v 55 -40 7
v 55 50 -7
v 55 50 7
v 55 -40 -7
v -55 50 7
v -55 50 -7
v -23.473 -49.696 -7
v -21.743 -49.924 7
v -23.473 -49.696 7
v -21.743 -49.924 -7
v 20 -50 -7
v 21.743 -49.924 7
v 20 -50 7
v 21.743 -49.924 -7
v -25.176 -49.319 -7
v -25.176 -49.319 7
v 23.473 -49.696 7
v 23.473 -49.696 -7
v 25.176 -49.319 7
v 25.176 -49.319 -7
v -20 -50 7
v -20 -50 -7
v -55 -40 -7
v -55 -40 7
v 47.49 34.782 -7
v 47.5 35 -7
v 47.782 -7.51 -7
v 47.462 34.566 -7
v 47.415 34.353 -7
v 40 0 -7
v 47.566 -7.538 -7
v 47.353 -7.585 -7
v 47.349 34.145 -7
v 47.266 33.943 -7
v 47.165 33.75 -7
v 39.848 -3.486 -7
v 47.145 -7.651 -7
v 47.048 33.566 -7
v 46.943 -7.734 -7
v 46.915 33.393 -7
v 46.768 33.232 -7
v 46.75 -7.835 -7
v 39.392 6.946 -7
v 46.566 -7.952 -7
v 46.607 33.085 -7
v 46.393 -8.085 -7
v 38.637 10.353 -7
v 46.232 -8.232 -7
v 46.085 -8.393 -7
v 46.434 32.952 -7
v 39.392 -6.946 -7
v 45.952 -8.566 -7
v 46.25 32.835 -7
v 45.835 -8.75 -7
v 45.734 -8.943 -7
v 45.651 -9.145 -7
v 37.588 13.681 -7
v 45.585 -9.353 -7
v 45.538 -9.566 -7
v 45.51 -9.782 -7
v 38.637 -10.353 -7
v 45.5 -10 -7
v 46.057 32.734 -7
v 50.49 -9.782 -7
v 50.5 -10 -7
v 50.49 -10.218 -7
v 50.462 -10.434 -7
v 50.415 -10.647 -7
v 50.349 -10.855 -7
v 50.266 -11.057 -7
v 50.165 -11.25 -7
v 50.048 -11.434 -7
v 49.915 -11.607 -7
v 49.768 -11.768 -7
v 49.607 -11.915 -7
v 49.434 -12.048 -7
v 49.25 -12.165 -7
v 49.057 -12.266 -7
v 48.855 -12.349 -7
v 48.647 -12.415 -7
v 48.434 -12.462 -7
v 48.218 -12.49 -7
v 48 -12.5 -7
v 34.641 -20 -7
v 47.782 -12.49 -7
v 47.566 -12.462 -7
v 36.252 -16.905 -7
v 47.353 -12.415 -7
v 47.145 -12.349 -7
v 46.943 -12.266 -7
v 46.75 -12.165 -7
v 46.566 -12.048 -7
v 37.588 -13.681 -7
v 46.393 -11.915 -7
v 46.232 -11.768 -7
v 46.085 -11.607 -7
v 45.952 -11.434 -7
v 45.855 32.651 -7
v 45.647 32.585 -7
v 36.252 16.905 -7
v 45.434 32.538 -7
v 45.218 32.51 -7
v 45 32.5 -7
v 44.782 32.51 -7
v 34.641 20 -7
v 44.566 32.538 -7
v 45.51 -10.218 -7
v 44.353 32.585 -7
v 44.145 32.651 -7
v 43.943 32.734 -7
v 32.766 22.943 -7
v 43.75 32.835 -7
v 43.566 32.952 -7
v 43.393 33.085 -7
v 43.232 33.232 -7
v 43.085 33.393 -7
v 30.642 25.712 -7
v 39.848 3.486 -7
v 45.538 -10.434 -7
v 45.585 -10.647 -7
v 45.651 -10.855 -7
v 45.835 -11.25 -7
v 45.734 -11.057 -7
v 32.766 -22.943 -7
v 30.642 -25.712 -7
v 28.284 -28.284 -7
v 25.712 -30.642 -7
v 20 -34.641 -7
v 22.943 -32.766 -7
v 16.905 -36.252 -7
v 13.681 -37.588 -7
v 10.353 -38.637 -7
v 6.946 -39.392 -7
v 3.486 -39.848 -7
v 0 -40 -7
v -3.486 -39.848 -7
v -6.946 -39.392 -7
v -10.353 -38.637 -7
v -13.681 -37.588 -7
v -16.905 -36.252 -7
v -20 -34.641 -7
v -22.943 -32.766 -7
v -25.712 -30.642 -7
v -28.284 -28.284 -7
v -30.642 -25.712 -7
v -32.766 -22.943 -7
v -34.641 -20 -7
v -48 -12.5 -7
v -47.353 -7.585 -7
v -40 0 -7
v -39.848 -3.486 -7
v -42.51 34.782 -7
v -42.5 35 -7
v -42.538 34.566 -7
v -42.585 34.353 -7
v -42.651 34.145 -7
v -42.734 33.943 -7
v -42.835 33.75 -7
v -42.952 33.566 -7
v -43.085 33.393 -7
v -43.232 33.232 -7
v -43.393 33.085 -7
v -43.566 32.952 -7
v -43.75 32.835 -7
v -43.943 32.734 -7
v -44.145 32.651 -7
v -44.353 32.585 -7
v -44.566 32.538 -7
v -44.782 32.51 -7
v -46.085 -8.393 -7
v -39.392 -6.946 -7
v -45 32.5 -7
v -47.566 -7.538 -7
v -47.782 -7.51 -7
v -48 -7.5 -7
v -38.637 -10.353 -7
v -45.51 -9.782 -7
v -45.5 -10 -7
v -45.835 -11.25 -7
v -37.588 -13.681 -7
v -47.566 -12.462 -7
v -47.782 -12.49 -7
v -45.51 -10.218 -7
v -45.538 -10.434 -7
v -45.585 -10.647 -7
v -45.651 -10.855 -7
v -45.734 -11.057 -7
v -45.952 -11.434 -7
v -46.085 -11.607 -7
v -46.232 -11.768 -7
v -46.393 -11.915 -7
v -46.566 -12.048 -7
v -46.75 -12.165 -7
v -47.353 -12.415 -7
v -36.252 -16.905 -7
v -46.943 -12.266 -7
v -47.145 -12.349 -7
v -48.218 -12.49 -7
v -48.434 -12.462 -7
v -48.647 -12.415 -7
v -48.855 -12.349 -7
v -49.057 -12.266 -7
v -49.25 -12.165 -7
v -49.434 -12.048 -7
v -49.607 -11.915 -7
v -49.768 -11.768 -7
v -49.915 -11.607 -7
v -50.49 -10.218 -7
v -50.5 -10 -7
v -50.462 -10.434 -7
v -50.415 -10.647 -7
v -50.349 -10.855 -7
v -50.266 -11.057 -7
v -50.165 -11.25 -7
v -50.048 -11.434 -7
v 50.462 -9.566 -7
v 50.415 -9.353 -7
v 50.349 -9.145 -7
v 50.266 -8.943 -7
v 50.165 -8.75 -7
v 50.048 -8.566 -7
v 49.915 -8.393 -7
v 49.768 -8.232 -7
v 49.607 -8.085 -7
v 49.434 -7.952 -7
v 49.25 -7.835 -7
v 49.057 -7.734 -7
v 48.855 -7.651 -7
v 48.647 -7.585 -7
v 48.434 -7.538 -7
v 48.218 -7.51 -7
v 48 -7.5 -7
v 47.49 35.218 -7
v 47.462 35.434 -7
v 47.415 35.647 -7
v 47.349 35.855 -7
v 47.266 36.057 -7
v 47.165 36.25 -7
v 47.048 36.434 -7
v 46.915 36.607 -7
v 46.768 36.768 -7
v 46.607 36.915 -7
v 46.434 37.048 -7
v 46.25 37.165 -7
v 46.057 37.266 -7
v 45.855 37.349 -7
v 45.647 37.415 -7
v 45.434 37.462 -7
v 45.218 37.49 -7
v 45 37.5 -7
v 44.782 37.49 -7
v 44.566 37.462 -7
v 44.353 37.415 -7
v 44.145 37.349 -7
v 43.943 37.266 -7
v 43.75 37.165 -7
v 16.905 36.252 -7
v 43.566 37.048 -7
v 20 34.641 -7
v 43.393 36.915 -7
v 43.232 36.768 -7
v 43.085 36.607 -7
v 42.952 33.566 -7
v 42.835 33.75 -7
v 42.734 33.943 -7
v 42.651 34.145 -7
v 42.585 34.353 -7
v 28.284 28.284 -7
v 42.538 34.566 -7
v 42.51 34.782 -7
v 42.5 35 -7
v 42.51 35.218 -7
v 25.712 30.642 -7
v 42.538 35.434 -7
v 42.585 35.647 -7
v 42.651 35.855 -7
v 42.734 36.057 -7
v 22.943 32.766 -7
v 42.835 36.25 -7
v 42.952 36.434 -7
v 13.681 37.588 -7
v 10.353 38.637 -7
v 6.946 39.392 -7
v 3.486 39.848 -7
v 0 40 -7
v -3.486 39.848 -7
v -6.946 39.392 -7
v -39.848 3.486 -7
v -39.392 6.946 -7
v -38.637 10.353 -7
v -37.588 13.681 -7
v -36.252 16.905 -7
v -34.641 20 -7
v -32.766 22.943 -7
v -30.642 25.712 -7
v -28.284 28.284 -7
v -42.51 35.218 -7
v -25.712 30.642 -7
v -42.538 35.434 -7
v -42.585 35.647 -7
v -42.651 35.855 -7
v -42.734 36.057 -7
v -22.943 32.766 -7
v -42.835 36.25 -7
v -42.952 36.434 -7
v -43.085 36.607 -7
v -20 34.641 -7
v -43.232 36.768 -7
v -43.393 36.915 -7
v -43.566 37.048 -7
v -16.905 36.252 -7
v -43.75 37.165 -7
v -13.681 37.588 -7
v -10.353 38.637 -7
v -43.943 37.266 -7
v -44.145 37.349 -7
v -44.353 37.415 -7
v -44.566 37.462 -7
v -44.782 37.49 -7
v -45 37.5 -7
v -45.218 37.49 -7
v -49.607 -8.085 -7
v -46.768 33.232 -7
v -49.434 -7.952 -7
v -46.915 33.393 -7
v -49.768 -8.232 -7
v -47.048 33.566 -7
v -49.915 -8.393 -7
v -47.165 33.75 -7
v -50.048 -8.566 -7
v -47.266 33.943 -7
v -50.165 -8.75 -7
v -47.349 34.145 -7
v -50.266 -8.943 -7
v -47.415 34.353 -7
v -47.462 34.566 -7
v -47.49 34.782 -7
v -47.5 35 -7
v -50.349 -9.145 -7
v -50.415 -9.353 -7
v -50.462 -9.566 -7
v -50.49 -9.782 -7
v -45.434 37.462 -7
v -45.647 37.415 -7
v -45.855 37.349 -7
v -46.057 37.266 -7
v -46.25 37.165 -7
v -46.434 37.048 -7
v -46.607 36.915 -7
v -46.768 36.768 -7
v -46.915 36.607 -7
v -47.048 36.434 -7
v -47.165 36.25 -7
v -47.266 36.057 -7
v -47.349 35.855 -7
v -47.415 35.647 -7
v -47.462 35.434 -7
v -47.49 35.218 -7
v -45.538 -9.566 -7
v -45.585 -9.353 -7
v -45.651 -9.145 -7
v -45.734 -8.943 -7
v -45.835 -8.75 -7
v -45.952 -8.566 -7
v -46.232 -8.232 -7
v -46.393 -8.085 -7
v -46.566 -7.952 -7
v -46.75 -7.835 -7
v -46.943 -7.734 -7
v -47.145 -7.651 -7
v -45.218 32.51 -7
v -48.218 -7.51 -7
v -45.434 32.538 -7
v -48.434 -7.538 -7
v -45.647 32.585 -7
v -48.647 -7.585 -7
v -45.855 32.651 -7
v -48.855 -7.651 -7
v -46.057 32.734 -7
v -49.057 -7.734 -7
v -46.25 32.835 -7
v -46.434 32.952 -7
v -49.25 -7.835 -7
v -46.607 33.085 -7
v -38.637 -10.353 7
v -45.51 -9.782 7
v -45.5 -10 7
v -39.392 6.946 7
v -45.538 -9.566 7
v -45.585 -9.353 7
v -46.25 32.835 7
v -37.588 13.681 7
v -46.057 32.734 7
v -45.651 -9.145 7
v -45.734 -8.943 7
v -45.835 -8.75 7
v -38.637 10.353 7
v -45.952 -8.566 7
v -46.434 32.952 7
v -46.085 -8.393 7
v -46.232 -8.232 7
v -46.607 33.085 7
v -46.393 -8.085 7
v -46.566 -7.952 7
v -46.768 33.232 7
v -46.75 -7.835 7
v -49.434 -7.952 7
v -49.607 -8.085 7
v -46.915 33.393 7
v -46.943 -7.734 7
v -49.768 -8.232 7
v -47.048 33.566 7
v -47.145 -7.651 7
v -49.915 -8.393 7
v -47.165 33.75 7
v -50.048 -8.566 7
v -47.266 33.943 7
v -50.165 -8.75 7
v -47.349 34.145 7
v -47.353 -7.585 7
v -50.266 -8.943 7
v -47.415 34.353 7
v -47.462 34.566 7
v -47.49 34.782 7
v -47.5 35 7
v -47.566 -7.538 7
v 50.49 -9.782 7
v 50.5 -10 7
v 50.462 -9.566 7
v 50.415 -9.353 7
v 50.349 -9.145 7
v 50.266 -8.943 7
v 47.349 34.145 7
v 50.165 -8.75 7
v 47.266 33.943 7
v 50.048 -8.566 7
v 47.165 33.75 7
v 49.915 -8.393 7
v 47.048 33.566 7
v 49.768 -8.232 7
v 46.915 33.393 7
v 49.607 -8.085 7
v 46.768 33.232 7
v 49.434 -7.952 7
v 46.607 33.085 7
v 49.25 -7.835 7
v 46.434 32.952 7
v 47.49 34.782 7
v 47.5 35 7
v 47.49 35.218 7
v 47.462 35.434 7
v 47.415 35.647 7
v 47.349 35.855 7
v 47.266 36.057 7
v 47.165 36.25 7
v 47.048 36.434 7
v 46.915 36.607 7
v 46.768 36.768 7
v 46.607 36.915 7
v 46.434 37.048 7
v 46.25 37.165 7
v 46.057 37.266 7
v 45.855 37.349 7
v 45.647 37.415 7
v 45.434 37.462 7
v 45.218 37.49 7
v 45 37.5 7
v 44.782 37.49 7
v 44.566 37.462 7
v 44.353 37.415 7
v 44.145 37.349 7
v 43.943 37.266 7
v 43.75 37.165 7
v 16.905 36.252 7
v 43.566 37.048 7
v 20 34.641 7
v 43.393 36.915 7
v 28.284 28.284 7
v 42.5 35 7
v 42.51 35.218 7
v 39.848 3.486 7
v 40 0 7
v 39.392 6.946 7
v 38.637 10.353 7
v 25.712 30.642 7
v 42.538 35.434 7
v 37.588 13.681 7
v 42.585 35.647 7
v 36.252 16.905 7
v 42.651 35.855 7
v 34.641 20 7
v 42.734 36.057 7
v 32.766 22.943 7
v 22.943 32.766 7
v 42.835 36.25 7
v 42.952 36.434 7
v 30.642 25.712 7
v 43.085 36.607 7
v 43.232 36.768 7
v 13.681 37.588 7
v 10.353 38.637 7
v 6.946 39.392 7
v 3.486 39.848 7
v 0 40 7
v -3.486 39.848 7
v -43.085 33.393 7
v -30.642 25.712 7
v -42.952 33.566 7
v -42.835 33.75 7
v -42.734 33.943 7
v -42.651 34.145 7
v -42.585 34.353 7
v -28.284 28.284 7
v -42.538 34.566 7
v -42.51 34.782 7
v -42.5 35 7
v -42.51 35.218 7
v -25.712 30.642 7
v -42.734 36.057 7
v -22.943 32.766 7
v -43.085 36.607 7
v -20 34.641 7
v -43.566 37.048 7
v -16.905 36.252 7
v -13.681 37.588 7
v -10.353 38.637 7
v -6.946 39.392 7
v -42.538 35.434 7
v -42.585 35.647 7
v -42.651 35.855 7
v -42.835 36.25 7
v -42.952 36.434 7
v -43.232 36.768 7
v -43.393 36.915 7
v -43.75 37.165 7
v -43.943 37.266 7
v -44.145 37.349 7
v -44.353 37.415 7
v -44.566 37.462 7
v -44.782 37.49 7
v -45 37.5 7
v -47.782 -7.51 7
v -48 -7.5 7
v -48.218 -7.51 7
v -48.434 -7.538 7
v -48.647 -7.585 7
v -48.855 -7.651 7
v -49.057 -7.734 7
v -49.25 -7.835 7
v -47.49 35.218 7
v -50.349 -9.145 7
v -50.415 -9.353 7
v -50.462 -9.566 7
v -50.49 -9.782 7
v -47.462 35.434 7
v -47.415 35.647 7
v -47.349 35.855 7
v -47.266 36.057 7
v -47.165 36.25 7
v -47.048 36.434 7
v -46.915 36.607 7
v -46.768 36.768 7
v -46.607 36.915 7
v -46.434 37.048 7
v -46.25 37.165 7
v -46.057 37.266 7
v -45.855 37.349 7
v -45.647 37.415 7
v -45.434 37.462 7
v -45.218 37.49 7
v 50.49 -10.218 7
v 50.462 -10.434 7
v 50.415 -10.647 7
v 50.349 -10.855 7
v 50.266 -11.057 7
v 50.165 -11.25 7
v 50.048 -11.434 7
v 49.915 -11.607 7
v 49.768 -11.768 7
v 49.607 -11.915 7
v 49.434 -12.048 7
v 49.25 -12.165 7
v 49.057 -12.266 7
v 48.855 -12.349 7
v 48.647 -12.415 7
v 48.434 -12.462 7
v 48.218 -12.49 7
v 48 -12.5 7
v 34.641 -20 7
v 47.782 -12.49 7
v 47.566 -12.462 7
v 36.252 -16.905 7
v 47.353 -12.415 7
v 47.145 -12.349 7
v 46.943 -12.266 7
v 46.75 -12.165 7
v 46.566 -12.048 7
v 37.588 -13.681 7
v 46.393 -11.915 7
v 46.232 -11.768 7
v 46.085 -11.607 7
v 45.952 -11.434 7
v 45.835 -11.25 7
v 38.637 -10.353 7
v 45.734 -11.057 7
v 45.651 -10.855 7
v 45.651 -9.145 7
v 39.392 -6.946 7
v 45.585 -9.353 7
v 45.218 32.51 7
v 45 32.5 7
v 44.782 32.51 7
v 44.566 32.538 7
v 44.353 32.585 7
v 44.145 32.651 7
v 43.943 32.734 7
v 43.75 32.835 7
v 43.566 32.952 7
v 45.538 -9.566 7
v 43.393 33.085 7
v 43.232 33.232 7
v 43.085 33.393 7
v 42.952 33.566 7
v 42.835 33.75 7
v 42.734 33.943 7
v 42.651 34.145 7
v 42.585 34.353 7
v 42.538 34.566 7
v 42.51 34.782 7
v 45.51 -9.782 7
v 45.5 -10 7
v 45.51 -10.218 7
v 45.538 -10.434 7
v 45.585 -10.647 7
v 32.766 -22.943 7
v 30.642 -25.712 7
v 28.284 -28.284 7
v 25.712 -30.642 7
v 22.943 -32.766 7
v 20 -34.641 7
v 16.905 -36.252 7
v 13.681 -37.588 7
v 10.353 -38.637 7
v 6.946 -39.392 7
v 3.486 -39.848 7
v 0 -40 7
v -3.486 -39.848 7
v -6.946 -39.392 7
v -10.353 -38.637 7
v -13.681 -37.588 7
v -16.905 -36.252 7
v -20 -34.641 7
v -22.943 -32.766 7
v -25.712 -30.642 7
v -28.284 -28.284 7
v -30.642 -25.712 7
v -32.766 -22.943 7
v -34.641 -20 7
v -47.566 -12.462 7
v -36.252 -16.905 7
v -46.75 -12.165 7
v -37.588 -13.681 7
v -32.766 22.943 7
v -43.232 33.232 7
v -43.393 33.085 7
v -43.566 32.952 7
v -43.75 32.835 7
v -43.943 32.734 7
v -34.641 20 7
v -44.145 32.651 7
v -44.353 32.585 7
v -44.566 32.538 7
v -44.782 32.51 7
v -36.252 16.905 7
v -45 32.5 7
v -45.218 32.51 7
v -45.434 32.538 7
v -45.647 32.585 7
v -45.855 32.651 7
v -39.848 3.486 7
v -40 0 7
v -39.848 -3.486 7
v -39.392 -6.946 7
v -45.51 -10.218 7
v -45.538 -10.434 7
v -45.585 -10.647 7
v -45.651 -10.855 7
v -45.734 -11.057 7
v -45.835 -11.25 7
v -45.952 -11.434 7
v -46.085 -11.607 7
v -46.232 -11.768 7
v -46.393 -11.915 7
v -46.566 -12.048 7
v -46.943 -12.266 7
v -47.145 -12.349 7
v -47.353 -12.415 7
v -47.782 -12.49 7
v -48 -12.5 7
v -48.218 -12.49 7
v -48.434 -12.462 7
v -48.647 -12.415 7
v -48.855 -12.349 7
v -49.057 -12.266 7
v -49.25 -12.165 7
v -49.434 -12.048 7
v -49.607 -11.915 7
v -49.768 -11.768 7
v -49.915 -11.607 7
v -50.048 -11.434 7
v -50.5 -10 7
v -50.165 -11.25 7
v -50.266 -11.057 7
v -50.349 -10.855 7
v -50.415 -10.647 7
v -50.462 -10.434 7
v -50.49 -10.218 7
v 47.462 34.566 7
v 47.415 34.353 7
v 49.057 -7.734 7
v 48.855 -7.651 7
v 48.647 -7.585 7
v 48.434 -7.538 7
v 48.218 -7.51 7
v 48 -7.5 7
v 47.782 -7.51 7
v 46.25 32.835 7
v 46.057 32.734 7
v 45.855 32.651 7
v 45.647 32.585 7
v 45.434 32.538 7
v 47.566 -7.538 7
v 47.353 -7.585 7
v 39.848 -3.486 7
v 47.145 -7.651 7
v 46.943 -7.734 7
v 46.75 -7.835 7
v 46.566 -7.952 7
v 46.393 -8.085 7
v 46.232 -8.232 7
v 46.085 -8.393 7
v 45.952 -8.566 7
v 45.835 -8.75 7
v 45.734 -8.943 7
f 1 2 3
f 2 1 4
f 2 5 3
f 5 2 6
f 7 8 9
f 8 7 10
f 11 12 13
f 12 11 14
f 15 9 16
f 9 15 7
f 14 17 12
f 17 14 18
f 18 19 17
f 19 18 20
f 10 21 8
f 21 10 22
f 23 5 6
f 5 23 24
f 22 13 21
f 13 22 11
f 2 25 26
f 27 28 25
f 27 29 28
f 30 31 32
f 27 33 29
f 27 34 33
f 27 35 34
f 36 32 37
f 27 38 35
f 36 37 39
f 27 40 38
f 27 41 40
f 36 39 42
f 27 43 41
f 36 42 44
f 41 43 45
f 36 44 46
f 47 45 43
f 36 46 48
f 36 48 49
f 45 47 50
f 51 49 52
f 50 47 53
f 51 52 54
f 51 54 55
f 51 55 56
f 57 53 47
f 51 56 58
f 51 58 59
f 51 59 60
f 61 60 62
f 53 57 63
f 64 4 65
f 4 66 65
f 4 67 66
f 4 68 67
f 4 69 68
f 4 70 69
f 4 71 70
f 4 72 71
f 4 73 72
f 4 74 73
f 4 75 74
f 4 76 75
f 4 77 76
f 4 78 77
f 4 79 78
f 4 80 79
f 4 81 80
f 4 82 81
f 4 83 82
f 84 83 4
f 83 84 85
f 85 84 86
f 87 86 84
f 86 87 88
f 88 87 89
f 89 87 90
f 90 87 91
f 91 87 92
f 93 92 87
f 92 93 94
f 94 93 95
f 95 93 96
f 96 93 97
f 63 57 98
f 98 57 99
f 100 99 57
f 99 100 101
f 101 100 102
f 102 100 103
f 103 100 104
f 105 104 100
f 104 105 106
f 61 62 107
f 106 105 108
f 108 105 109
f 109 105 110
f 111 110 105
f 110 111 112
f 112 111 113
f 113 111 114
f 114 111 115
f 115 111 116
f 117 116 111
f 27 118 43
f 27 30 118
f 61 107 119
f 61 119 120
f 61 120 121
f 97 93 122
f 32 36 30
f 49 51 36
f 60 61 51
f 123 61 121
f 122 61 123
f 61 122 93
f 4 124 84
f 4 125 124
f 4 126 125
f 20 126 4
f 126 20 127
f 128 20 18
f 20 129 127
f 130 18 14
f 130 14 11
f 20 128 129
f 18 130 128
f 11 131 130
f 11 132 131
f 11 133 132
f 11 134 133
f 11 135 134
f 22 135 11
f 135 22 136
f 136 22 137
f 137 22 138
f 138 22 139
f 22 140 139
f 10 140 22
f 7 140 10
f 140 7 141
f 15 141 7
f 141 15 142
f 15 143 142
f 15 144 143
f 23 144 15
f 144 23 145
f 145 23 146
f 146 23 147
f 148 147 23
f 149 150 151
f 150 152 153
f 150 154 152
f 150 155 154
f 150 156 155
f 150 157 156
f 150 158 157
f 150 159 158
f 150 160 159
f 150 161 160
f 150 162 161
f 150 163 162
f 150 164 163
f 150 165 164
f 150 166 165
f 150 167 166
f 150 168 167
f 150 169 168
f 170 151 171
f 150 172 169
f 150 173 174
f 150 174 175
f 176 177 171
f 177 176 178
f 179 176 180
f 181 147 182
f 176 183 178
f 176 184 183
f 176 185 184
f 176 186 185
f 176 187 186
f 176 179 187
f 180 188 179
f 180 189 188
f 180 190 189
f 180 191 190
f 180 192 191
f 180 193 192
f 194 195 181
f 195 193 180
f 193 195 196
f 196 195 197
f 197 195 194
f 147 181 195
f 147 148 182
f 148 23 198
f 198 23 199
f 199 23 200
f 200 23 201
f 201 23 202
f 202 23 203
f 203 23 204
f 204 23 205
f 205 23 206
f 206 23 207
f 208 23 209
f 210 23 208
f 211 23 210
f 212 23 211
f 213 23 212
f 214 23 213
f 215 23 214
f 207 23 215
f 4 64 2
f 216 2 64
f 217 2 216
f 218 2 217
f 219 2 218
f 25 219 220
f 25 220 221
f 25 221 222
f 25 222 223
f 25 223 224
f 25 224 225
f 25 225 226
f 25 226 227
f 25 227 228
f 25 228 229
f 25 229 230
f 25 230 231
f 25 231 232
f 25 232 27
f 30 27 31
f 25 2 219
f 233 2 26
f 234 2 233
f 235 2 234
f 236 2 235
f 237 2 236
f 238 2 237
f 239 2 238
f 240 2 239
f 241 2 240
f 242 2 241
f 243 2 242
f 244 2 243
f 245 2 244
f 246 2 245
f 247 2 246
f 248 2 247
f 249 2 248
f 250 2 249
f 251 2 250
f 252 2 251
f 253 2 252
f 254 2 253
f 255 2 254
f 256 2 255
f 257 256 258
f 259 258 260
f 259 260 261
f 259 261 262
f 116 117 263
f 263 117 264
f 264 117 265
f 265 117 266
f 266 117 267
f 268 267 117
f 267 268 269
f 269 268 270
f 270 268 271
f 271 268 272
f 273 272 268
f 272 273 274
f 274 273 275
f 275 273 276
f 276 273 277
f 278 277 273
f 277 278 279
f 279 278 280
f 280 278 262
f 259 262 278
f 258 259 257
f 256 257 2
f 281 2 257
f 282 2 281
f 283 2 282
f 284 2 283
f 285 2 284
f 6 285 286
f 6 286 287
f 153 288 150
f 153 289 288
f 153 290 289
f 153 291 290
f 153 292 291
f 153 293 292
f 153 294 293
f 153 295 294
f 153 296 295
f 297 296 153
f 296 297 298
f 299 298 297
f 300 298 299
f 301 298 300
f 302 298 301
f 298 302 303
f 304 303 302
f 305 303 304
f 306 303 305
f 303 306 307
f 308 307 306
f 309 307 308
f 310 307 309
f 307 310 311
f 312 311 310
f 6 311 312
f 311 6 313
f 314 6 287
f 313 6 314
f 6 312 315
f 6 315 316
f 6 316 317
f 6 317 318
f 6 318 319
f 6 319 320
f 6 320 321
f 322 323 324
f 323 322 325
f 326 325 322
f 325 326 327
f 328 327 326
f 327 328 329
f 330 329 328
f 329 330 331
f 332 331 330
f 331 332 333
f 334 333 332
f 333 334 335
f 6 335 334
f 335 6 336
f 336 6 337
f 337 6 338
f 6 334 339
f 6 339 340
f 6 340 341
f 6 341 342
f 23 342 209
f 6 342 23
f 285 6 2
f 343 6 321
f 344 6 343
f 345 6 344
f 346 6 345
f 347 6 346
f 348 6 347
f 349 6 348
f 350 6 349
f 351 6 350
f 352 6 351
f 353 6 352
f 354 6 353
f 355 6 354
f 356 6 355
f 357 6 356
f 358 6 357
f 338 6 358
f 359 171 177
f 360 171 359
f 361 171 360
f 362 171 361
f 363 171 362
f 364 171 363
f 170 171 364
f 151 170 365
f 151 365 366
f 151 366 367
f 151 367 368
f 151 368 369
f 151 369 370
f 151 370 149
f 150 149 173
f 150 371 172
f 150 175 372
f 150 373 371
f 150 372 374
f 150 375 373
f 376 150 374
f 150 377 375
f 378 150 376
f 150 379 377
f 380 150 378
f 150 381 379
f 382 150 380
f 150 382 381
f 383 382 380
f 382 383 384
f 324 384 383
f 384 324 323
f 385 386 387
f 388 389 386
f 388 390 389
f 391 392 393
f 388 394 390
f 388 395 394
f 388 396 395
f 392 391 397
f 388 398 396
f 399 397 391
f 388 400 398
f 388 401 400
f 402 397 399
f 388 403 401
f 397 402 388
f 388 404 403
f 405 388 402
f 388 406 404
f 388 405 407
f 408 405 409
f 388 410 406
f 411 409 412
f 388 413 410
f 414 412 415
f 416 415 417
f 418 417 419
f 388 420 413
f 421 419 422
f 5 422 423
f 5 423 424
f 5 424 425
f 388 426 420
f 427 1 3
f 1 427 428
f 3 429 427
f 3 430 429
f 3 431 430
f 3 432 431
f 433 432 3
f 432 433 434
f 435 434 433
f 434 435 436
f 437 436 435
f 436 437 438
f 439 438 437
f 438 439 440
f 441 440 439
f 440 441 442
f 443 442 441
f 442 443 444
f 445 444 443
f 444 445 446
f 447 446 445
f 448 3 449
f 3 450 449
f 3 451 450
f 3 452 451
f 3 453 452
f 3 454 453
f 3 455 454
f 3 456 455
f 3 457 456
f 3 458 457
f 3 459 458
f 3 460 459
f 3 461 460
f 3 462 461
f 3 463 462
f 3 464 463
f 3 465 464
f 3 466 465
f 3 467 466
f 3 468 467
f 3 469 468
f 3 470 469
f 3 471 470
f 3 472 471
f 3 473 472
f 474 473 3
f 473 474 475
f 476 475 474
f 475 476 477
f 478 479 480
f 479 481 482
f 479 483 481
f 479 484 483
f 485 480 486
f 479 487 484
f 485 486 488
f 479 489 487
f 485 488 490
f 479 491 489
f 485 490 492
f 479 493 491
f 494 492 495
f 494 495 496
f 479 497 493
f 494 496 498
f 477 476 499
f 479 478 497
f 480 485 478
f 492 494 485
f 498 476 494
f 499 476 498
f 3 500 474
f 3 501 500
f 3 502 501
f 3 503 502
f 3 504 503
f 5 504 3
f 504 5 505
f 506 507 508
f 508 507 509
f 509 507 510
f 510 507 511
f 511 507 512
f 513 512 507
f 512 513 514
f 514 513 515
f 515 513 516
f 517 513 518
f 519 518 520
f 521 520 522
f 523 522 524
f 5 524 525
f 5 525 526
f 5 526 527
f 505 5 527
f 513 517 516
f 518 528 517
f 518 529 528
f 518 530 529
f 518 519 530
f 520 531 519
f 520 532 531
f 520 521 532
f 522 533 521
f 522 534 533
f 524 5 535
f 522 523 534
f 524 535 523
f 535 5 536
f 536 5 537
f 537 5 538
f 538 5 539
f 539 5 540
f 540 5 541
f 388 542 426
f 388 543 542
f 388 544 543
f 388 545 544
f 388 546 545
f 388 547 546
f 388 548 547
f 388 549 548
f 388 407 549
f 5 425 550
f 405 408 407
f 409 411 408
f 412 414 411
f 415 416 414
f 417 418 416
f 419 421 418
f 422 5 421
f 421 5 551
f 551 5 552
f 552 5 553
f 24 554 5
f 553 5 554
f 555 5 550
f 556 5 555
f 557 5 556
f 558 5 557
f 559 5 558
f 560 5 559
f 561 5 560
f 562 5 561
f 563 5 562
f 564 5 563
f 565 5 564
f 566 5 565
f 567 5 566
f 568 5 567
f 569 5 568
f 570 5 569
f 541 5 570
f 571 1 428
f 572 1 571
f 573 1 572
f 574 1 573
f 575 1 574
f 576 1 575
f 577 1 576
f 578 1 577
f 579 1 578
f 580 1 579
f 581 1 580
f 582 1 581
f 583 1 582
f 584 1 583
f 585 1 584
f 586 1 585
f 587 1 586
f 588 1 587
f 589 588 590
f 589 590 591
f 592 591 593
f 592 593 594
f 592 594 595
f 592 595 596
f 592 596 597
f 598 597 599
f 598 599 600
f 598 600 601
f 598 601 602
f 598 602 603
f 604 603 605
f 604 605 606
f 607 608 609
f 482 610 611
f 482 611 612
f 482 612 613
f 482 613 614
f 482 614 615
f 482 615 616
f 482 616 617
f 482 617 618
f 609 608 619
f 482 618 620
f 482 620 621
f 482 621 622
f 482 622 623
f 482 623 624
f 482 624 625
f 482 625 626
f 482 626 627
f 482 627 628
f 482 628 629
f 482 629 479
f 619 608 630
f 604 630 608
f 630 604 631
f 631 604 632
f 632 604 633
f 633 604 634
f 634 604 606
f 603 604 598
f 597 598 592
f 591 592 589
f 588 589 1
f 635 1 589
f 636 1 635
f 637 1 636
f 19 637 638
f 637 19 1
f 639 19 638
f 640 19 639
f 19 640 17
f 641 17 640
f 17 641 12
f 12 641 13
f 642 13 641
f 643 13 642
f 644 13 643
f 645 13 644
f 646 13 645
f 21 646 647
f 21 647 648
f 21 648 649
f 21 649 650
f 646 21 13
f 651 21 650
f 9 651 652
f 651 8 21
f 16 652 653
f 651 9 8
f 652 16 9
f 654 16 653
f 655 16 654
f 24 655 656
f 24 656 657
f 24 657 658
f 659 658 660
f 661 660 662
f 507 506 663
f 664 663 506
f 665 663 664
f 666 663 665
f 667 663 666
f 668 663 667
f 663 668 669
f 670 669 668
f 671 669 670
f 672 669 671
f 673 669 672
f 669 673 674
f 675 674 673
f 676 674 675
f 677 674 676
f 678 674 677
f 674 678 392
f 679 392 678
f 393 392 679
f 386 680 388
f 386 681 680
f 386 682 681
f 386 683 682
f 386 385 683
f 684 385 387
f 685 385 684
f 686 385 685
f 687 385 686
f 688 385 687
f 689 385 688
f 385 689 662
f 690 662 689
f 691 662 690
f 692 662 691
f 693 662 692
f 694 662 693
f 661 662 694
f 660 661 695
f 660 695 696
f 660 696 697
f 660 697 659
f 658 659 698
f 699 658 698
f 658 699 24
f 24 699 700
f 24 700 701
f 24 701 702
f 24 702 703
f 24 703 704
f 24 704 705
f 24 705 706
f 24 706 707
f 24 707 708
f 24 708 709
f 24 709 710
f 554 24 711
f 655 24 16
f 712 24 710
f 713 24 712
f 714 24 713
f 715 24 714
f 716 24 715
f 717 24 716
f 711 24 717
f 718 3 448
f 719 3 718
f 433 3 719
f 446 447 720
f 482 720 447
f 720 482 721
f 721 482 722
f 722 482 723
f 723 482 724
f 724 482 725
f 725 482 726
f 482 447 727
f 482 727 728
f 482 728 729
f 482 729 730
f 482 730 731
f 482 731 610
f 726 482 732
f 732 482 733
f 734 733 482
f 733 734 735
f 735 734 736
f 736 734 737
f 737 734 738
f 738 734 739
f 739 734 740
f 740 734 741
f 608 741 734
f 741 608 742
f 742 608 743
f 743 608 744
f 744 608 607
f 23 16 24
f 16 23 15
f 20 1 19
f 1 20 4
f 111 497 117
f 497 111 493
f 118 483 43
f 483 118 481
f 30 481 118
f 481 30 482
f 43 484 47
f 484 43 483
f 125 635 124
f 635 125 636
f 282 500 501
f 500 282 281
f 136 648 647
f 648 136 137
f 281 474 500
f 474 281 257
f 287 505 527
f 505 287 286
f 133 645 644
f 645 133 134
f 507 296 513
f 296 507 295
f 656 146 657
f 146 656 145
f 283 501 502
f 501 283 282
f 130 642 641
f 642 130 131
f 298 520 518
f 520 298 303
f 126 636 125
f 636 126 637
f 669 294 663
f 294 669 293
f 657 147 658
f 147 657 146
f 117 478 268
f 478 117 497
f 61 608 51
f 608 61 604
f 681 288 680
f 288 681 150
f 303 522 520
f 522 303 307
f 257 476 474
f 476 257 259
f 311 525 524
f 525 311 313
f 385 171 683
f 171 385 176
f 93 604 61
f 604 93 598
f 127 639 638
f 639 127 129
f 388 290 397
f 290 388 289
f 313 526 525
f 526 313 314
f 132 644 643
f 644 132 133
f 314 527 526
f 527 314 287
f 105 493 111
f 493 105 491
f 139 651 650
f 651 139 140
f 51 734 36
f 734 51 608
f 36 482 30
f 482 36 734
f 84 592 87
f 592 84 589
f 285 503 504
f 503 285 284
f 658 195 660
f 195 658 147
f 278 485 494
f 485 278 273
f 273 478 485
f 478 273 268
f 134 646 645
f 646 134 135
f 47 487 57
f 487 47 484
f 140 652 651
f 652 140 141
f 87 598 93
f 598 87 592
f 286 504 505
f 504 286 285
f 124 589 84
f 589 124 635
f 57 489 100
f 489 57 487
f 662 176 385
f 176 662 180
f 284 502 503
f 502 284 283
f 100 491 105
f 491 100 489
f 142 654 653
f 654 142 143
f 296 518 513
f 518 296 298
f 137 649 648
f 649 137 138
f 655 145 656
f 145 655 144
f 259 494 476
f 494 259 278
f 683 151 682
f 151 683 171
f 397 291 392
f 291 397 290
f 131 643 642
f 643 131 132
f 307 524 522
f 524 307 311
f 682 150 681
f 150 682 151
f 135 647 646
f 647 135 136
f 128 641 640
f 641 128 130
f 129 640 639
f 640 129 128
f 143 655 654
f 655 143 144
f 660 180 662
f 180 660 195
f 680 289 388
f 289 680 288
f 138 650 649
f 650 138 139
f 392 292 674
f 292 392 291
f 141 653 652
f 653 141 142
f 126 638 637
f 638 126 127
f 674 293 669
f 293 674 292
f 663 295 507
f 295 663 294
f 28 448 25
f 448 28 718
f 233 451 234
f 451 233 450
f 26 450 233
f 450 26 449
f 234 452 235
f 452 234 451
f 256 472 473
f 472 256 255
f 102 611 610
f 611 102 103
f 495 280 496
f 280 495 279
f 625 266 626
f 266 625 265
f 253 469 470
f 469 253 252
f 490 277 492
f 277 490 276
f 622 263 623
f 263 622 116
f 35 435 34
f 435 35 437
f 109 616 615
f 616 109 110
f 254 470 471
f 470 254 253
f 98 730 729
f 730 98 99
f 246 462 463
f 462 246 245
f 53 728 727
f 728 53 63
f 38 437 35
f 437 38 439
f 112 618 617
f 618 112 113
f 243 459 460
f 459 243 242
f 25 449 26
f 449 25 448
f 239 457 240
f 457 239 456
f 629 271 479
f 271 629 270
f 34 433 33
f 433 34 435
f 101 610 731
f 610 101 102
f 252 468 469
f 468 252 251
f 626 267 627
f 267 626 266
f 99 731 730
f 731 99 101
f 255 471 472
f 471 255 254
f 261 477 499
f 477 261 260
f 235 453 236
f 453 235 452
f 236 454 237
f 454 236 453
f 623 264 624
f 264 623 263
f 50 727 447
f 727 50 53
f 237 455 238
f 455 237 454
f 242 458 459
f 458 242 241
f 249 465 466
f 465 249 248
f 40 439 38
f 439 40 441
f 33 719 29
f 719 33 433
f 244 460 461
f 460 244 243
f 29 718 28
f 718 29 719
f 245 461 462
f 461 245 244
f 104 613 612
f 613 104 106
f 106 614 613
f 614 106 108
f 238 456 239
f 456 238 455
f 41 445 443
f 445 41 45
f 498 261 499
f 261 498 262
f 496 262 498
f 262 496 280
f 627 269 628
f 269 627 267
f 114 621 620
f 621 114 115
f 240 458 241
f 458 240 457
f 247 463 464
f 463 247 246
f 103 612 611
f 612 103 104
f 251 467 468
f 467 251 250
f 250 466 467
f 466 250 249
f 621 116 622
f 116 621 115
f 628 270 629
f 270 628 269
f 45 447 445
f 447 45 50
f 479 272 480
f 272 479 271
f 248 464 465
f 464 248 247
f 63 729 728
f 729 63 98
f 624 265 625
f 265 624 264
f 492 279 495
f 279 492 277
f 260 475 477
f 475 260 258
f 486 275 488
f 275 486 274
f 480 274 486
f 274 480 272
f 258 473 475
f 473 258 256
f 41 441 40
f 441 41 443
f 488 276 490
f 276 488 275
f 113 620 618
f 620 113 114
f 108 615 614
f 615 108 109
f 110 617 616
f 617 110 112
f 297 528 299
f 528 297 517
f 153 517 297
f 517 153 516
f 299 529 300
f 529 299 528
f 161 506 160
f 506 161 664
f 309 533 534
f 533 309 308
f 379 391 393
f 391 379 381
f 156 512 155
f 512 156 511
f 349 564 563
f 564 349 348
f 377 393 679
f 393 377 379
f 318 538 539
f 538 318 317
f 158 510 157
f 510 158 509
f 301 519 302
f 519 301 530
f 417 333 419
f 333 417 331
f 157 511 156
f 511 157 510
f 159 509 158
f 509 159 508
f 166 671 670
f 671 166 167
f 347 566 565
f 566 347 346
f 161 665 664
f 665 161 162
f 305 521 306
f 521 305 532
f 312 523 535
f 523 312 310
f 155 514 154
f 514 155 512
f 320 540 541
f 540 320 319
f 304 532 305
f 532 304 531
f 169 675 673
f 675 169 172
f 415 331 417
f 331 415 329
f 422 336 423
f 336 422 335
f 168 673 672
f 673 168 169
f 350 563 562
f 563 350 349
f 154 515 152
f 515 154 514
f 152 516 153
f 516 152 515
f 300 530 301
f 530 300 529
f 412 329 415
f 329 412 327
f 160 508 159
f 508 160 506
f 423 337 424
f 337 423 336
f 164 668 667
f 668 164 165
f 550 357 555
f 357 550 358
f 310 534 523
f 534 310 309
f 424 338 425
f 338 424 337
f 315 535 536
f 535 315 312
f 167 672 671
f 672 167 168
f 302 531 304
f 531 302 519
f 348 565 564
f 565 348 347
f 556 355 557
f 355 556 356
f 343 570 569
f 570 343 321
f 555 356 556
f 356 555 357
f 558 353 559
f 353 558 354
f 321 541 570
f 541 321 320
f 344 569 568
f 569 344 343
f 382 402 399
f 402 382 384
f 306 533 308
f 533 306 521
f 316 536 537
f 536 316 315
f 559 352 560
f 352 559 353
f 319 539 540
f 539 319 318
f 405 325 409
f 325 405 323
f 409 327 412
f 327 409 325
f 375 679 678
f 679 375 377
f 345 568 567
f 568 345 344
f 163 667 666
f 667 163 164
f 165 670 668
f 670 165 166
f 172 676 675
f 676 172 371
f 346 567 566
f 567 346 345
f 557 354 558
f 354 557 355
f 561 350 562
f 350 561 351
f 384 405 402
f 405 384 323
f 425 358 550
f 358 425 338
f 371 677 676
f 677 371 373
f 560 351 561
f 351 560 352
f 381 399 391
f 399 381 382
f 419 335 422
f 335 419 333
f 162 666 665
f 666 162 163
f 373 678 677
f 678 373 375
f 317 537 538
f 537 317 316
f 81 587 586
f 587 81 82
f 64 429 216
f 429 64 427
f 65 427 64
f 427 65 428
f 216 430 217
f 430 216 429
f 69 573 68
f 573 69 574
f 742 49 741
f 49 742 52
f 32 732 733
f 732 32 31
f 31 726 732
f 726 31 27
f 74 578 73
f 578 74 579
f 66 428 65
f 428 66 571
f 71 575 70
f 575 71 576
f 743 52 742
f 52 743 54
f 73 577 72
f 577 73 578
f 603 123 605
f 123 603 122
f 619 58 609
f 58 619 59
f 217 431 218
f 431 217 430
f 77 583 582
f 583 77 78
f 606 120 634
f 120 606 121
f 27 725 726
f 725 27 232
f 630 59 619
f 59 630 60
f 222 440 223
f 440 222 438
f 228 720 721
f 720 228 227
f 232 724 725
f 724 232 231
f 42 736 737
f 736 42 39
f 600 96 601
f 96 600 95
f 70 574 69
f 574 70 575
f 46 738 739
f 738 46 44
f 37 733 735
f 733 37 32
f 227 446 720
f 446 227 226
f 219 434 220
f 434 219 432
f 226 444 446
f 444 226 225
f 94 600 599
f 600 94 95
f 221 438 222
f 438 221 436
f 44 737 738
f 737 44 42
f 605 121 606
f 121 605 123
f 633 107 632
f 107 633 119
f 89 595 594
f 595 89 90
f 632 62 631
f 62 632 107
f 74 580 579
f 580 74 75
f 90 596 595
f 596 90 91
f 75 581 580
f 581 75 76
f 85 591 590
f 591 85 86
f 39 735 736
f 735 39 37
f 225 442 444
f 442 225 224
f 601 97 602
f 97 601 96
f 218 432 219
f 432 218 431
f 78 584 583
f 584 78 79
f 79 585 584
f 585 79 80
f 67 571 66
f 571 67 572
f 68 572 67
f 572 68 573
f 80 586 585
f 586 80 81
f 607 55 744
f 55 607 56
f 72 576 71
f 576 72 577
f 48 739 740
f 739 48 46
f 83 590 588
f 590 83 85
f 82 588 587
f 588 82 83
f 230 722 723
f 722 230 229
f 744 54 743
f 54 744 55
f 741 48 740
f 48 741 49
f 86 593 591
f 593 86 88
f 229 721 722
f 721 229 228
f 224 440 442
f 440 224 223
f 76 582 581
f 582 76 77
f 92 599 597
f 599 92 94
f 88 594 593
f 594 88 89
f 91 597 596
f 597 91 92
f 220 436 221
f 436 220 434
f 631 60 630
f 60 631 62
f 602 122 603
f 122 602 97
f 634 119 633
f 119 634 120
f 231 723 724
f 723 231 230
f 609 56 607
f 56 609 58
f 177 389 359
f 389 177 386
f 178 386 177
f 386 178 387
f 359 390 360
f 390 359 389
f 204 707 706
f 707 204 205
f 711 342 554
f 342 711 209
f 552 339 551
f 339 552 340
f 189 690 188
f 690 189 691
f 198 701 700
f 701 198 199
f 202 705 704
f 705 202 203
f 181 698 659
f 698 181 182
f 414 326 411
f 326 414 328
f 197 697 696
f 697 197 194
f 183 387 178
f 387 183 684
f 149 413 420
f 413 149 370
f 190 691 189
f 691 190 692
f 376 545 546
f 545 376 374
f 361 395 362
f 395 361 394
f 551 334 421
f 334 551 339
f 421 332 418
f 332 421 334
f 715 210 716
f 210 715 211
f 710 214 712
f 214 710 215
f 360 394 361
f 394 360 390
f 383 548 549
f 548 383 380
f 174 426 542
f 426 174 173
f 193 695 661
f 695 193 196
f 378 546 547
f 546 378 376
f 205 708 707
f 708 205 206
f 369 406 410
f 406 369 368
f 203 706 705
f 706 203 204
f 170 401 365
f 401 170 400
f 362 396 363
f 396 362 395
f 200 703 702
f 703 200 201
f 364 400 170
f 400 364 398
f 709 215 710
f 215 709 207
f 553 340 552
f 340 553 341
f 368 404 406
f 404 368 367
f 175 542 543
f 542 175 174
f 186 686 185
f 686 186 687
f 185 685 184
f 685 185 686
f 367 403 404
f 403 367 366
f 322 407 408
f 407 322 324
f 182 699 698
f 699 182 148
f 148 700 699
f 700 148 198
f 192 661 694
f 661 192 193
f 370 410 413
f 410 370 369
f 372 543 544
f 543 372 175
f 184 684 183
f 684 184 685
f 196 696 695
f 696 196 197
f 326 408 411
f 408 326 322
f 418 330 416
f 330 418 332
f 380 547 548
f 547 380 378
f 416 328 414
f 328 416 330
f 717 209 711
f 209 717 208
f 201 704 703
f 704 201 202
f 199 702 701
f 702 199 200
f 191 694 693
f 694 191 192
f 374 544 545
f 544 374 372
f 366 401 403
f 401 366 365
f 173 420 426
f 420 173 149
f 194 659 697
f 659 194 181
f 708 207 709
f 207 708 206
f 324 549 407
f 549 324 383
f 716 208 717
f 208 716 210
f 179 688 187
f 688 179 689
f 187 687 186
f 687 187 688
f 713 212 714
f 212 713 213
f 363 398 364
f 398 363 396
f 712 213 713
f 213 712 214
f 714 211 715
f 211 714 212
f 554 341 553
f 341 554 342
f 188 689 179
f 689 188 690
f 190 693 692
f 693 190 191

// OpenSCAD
// SPDX-License-Identifier: CC-BY-SA-4.0
//
//Spacer to allow space for the propeller between the intake and the nozzle
//
//Copyright (C) 2018 Peter Bennett <thelargeostrich@gmail.com>
//
//This design is licensed under a Creative Commons Attribution-ShareAlike
//4.0 International license.
//
//You are free to:
//  Share — copy and redistribute the material in any medium or format
//  Adapt — remix, transform, and build upon the material
//          for any purpose, even commercially.
//
//Under the following terms:
//
//  Attribution — You must give appropriate credit, provide a link to
//                the license, and indicate if changes were made. You
//                may do so in any reasonable manner, but not in any
//                way that suggests the licensor endorses you or your use.
//  ShareAlike  — If you remix, transform, or build upon the material,
//                you must distribute your contributions under the same
//                license as the original.
//  No additional restrictions — You may not apply legal terms or
//                technological measures that legally restrict others
//                from doing anything the license permits.

THICKNESS=14;
$fn=72;
module propspace(){
    difference(){
        union(){
            hull(){
                translate([0,5,0])
                    cube([110,90,THICKNESS],center=true);
                translate([-20,-30,0])
                    cylinder(r=20,h=THICKNESS,center=true);
                translate([20,-30,0])
                    cylinder(r=20,h=THICKNESS,center=true);
            };
        }
        cylinder(r=40,h=30,center=true);
        translate([45,35,0])
            cylinder(r=2.5,h=30,center=true);
        translate([-45,35,0])
            cylinder(r=2.5,h=30,center=true);
        translate([48,-10,0])
            cylinder(r=2.5,h=30,center=true);
        translate([-48,-10,0])
            cylinder(r=2.5,h=30,center=true);
        translate([62.5,0,0])
            rotate([90,0,0])
                cylinder(r=2.5,h=130,center=true);
    };
}
propspace();
